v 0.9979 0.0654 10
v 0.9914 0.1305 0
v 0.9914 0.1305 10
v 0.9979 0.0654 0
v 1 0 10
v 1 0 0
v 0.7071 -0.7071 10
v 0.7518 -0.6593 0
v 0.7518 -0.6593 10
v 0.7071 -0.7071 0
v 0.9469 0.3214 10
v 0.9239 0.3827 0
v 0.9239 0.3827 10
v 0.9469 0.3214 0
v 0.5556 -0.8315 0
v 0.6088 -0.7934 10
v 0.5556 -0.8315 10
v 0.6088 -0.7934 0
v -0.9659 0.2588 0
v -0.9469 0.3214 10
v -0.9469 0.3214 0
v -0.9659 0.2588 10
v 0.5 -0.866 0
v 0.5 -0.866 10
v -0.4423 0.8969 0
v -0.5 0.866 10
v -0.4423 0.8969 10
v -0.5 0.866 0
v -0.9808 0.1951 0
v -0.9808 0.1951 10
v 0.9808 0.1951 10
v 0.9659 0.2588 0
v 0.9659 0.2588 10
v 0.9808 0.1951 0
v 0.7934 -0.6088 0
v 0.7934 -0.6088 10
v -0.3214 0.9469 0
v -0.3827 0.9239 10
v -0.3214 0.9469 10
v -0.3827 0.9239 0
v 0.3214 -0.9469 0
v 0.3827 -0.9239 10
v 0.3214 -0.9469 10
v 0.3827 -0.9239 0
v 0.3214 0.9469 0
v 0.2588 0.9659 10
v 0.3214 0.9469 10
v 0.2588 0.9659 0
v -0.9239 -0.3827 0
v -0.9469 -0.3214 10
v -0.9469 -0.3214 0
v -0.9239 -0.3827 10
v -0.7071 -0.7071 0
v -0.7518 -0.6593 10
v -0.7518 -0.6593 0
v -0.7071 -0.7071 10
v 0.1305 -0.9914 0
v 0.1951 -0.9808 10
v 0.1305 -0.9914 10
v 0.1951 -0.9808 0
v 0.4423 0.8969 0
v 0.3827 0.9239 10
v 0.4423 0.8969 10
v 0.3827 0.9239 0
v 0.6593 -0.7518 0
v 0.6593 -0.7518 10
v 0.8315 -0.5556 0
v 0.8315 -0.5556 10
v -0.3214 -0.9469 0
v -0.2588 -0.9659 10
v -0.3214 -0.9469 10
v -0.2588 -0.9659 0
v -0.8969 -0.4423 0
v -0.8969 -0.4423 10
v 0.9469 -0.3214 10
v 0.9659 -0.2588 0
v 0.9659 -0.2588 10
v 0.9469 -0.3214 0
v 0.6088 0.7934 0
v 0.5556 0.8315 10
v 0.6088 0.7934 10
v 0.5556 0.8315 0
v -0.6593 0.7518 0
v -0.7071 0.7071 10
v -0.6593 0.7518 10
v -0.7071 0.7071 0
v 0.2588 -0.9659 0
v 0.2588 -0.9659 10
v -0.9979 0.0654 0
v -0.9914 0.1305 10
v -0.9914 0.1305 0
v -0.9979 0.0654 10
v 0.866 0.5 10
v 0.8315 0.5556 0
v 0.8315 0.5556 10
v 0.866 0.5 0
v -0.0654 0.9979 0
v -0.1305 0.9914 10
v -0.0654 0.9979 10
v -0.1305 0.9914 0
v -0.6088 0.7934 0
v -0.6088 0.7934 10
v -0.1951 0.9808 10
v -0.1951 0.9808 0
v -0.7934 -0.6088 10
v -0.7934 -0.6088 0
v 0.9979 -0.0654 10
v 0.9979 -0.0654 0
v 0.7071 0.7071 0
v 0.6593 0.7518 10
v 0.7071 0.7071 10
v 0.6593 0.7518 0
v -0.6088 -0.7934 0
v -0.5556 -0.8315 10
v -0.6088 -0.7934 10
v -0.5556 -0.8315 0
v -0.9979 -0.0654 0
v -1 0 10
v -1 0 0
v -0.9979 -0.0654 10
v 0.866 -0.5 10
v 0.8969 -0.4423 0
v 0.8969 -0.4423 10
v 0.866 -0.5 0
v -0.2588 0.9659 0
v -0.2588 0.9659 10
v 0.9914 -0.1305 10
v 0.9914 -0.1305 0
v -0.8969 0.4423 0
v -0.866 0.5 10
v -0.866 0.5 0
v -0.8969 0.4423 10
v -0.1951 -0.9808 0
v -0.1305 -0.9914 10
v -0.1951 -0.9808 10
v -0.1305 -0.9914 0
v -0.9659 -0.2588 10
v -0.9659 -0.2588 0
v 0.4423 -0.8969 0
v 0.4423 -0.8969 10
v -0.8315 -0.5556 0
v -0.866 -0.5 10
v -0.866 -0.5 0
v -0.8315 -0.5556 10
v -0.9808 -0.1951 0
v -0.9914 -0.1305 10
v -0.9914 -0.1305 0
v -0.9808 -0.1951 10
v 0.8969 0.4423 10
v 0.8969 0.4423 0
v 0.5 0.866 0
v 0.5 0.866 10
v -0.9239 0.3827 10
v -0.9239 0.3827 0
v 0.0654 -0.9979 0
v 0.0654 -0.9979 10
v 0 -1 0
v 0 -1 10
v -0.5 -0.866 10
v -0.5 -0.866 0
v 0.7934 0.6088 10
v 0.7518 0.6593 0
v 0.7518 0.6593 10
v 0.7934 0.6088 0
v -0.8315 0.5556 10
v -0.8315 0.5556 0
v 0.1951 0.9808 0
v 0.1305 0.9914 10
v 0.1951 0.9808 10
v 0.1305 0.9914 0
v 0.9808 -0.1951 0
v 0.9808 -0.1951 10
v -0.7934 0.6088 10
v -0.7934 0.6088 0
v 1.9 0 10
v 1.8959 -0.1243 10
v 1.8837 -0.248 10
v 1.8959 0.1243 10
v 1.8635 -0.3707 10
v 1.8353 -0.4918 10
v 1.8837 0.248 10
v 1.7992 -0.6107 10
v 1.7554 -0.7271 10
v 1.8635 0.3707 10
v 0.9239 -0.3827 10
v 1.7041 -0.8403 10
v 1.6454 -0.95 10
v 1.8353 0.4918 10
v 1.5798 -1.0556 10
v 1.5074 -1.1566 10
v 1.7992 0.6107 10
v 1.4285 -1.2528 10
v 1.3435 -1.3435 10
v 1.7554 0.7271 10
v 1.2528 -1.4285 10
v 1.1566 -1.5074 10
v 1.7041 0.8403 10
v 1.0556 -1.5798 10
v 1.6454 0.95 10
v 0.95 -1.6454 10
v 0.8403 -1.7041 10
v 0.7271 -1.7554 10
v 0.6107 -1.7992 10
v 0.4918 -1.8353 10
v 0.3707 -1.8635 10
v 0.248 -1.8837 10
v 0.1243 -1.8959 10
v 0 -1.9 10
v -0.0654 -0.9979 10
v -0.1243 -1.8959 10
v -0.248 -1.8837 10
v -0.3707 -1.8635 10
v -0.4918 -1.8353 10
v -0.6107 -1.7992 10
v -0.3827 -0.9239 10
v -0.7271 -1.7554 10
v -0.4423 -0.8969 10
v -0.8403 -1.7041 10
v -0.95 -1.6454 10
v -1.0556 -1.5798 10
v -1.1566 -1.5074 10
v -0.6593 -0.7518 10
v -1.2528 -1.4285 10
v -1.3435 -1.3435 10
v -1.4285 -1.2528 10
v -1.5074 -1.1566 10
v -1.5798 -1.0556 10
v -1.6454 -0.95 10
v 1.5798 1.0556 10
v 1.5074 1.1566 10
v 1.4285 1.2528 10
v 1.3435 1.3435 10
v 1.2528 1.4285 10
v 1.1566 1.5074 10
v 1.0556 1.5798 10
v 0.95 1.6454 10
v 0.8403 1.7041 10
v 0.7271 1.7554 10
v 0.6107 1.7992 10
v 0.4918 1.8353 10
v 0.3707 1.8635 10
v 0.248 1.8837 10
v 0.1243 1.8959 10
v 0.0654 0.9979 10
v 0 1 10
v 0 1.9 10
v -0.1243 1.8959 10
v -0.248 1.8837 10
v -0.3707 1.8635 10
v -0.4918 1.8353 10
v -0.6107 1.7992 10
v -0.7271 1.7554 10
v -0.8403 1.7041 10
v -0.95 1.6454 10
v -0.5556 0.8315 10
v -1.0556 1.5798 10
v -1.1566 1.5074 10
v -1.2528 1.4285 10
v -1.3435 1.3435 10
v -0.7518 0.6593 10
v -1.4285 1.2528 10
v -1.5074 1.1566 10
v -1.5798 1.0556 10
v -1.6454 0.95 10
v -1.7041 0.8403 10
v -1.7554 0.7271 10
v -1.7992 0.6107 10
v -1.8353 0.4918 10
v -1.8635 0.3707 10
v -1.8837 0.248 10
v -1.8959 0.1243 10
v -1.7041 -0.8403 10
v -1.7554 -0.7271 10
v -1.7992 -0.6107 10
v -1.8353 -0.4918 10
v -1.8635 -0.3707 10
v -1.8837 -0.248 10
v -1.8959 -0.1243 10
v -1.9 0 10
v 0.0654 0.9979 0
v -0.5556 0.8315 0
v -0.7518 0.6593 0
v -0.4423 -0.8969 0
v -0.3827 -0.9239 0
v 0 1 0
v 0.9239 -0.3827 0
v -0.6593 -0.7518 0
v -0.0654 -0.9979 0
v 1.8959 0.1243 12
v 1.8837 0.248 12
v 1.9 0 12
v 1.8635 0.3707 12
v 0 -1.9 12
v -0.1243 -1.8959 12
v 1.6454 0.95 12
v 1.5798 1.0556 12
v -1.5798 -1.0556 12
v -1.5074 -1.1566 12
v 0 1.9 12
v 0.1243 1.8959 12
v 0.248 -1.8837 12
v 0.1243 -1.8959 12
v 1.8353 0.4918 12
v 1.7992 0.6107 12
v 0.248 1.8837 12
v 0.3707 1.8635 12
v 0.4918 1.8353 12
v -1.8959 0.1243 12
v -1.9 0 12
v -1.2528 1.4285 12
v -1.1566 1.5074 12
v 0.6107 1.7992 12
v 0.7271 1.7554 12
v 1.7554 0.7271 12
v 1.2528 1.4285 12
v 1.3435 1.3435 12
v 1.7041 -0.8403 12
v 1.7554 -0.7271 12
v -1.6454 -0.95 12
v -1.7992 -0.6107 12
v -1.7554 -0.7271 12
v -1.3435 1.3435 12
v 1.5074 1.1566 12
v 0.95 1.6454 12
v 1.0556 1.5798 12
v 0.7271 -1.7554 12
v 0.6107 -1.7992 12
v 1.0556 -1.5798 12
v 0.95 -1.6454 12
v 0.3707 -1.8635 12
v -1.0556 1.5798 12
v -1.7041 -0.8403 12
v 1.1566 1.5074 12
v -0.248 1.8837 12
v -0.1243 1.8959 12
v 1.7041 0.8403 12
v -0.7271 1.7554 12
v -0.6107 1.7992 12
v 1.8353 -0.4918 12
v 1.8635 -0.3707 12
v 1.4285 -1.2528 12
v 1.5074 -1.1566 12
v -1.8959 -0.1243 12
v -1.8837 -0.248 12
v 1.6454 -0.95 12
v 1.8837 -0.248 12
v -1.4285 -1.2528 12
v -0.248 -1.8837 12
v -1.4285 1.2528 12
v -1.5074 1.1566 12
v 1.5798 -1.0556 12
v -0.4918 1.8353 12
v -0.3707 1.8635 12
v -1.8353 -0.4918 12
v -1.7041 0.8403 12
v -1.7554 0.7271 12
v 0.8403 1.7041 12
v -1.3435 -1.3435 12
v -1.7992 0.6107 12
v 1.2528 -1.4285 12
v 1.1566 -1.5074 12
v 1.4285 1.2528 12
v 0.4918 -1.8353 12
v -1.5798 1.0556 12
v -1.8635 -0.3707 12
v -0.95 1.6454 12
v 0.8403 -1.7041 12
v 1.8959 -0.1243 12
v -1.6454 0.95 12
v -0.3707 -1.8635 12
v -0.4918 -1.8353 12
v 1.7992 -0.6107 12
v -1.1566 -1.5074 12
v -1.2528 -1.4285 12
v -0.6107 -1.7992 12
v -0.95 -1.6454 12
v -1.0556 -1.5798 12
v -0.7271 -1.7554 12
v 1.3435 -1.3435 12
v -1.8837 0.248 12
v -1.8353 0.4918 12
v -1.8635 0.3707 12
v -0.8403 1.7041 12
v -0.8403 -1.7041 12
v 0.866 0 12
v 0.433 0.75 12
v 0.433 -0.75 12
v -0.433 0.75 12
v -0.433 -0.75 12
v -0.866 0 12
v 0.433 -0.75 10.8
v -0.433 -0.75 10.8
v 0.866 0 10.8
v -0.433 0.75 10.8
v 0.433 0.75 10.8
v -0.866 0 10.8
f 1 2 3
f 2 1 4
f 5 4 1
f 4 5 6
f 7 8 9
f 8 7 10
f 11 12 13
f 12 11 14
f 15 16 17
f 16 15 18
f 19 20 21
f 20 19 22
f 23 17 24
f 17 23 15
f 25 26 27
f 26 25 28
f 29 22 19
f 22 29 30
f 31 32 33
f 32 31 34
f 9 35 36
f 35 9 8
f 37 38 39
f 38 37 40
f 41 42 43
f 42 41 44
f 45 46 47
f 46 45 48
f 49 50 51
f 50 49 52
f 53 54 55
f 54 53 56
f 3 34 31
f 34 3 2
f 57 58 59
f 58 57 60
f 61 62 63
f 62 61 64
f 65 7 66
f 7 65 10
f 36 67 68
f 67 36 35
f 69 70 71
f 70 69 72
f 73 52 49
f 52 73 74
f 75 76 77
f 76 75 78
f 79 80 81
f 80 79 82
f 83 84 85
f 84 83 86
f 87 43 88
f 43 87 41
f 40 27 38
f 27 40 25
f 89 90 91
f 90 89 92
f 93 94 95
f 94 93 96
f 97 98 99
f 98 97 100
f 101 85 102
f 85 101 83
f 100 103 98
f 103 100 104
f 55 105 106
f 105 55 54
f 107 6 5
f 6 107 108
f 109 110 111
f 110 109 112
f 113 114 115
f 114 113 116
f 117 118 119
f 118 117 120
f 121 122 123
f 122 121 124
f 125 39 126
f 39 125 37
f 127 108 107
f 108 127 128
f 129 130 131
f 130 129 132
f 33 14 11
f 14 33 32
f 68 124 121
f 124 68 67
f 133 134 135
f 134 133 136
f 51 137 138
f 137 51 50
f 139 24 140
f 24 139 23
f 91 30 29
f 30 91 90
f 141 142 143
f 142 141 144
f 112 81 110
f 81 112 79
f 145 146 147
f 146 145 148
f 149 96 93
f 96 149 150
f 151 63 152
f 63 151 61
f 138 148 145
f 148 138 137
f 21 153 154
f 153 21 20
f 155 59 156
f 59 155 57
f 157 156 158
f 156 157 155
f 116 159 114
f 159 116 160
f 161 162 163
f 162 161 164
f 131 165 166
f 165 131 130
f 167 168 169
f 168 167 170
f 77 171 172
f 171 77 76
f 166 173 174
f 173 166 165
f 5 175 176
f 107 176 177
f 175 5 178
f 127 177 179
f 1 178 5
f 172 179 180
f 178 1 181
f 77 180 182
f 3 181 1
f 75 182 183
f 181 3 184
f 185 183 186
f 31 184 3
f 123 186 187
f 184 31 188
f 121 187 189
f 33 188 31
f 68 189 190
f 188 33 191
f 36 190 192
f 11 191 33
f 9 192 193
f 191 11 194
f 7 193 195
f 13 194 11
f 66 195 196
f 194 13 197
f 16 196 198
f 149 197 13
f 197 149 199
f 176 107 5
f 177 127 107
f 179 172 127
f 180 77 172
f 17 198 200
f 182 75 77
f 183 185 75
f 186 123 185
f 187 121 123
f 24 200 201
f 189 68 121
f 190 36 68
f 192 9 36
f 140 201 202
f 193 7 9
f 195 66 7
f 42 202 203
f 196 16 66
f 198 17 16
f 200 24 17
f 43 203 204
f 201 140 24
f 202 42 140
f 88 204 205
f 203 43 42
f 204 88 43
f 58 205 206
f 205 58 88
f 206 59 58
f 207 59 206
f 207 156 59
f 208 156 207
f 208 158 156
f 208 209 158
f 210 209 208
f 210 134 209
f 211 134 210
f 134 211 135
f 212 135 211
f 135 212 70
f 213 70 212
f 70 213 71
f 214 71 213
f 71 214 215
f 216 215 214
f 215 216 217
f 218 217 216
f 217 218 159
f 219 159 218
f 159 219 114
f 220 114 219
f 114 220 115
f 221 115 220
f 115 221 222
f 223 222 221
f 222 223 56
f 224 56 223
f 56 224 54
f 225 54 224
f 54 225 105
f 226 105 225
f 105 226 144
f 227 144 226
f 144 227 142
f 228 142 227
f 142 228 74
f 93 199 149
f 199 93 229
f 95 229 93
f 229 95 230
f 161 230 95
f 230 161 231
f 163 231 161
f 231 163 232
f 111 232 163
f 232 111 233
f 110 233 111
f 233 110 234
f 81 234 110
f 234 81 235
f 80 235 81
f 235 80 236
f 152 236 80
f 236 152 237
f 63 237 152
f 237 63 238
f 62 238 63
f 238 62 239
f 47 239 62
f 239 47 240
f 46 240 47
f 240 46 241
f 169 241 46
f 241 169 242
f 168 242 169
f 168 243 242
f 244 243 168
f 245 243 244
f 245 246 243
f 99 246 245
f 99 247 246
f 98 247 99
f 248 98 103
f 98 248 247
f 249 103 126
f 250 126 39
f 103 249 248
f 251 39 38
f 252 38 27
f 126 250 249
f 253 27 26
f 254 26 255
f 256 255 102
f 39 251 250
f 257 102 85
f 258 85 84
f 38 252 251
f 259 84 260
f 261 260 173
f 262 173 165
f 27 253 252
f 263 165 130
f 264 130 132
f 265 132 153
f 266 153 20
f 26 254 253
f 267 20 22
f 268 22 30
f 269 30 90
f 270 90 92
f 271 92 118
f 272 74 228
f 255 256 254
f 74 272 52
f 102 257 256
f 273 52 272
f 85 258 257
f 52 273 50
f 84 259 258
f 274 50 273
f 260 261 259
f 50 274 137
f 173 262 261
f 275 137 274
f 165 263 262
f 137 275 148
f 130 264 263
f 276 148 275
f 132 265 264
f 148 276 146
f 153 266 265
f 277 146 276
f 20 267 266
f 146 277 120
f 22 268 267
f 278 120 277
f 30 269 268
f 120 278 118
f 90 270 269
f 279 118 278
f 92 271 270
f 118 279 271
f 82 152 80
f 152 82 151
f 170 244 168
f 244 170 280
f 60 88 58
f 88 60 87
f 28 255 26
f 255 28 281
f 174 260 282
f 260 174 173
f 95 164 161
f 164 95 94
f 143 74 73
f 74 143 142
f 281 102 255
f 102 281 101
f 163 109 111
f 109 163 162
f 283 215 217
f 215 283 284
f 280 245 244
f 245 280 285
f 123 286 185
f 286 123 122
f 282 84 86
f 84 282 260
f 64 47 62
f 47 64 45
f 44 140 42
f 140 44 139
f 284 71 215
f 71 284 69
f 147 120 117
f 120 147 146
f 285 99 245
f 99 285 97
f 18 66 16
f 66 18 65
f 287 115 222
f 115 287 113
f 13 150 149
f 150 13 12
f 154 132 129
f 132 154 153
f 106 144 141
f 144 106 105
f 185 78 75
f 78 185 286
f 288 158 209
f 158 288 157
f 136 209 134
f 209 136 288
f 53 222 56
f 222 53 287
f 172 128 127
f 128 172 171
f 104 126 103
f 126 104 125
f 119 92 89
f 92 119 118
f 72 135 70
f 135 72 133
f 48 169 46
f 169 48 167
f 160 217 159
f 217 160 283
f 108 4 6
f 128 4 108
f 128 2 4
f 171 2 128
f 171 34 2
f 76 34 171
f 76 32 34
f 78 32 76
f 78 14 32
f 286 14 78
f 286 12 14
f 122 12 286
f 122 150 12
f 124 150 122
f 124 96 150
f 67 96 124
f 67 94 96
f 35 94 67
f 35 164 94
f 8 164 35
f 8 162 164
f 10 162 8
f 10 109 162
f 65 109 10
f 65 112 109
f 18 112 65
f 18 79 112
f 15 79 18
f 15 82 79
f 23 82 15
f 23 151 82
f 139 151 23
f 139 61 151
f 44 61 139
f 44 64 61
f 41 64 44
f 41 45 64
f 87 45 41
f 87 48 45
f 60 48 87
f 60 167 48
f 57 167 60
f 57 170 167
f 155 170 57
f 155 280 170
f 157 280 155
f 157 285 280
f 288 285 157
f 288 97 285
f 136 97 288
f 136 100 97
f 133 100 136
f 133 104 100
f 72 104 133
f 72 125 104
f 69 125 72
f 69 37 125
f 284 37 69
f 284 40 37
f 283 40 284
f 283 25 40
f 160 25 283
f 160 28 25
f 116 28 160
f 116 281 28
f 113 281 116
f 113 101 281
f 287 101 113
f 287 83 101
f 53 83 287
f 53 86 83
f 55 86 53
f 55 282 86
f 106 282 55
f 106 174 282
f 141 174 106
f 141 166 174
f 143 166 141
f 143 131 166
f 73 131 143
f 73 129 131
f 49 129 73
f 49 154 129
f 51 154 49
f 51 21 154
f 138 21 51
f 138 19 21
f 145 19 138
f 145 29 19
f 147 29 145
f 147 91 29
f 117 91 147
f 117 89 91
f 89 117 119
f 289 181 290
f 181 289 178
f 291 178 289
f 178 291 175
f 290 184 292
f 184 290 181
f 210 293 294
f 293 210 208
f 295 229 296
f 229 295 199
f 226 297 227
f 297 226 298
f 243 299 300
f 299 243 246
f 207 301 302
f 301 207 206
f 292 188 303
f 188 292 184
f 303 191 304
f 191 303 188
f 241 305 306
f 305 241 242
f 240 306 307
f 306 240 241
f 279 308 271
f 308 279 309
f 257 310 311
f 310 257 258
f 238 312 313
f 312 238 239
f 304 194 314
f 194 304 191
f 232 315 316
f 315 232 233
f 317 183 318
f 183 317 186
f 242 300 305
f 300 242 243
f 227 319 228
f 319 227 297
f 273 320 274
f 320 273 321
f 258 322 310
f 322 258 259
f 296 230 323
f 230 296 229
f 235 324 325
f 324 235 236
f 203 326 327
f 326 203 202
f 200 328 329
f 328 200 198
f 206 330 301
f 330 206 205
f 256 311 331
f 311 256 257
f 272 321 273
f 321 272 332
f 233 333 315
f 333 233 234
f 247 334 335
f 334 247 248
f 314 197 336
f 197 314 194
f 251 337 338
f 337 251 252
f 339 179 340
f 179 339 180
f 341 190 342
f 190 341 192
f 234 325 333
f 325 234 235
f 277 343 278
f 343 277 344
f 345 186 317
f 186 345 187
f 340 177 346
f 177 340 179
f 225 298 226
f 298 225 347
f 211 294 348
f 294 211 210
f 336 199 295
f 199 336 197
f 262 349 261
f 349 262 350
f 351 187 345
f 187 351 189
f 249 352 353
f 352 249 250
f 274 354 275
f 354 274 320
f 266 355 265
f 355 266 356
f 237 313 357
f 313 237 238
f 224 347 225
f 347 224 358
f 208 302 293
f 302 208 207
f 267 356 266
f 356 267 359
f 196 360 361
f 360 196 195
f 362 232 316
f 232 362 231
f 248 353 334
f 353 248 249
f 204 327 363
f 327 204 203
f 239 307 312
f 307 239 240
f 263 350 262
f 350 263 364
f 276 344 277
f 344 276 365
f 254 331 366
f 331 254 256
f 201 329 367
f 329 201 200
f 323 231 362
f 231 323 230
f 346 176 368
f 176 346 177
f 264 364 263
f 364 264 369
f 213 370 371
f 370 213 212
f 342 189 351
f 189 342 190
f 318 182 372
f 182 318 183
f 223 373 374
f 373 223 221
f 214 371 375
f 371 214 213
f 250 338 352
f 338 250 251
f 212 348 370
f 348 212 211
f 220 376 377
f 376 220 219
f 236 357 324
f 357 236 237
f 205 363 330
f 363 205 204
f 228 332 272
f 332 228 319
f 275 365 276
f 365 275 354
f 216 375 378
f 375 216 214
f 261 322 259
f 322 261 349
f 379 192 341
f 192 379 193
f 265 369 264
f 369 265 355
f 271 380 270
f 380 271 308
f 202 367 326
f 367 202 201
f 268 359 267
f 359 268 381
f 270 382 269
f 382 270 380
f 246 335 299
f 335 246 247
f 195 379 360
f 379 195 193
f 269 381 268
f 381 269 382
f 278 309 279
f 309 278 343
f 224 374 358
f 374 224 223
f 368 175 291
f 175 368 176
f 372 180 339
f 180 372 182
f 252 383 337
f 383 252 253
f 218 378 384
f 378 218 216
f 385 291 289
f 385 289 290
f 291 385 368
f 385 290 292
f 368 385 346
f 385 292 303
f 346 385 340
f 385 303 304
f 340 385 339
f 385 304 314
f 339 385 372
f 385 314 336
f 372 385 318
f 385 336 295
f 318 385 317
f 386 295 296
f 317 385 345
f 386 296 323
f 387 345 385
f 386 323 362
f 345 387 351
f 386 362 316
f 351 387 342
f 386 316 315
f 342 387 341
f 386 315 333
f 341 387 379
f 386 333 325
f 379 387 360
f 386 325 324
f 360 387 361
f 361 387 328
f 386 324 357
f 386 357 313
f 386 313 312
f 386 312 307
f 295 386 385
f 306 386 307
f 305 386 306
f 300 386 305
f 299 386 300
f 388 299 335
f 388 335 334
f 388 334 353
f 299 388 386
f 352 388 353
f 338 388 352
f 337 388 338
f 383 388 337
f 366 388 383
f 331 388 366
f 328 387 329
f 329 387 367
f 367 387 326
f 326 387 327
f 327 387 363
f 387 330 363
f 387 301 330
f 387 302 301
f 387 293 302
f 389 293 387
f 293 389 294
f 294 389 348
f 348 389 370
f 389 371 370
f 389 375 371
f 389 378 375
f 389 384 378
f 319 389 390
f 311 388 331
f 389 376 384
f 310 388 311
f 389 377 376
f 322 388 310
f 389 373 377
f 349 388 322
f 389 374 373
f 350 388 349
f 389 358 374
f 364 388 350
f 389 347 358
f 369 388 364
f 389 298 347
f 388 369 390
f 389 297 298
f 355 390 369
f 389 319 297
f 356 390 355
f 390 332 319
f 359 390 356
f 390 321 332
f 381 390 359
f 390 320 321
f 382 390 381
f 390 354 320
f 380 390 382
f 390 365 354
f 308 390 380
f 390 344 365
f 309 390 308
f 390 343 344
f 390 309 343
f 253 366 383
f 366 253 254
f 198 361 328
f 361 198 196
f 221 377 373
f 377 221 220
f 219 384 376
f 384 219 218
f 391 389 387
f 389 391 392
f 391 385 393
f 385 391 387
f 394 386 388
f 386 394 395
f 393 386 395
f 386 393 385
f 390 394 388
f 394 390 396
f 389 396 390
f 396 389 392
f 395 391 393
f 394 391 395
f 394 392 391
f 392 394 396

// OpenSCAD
$fn=96;

// Socket head cap screw (approximate)
// Dimensions (mm)
d_shaft = 2.0;
L = 10.0;

d_head = 3.8;
h_head = 2.0;          // typical for M2-ish socket head
socket_d = 1.5;        // hex socket across flats approx
socket_depth = 1.2;    // socket depth

// Helper: hex prism by across-flats
module hex_prism_af(af, h){
    // For a regular hexagon, circumradius R = af / sqrt(3)
    R = af / sqrt(3);
    cylinder(h=h, r=R, $fn=6);
}

module socket_head_cap_screw(){
    difference(){
        union(){
            // Shaft
            cylinder(h=L, d=d_shaft);

            // Head
            translate([0,0,L])
                cylinder(h=h_head, d=d_head);
        }

        // Hex socket cut
        translate([0,0,L + h_head - socket_depth])
            hex_prism_af(socket_d, socket_depth + 0.05);
    }
}

socket_head_cap_screw();
